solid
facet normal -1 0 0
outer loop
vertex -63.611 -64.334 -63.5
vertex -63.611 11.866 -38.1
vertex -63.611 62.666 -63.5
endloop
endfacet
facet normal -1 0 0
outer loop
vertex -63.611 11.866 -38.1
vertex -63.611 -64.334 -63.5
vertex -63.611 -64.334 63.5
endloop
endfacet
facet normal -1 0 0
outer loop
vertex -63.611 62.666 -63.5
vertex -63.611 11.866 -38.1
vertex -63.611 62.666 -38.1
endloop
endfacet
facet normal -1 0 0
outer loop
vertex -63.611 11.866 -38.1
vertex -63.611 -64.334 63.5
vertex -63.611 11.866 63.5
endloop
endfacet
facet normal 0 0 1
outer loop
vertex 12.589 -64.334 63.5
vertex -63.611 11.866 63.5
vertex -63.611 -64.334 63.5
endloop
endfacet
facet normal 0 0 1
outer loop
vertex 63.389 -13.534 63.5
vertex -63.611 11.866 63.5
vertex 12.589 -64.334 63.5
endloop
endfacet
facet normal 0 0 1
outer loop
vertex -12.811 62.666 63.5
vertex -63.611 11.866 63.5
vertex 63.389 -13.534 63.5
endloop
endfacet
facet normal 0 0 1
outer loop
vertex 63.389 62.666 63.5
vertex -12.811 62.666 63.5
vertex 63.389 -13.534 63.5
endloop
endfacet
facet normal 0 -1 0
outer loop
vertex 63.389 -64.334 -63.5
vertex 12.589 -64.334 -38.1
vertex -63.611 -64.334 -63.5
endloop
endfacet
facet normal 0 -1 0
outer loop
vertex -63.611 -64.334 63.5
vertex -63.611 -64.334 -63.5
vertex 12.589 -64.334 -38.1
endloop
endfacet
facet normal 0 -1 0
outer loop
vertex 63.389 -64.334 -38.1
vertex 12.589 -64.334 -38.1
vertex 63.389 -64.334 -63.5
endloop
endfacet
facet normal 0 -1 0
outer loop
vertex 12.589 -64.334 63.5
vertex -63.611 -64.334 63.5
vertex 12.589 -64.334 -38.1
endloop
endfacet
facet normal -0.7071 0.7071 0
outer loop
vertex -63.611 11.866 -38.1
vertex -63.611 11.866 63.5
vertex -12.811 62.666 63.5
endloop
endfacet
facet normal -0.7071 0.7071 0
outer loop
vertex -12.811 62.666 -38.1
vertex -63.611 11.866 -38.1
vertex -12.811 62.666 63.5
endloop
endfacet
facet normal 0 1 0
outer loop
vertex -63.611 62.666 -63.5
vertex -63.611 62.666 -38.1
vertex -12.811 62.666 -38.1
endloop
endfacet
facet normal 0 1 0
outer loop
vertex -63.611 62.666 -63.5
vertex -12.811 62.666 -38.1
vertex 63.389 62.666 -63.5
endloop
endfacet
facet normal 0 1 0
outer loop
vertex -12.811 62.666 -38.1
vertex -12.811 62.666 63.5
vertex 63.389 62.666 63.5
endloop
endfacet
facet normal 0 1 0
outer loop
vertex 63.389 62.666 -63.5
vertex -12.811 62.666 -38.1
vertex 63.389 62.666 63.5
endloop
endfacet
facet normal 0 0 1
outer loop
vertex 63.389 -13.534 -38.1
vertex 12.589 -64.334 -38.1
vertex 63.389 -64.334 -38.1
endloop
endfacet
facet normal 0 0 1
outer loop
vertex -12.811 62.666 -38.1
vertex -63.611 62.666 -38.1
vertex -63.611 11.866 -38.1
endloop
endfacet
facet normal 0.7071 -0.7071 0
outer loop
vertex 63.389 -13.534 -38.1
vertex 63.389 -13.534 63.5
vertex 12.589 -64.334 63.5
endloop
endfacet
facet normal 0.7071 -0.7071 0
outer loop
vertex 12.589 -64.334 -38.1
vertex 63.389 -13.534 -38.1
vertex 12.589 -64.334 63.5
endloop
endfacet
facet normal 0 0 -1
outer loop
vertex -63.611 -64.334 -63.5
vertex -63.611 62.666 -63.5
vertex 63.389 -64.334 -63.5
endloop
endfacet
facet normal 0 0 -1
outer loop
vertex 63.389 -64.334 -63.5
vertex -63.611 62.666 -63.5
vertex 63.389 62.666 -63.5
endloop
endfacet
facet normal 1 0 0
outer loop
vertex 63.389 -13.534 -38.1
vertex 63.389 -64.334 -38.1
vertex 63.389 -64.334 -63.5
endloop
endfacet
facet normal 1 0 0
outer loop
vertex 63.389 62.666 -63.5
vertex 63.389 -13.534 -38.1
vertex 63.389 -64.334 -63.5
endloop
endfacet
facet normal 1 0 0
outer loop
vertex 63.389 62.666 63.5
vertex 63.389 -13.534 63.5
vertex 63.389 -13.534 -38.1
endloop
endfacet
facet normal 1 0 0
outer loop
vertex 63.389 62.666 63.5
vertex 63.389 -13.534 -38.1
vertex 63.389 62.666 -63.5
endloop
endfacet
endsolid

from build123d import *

# Parameters (mm, degrees)
F0_W     = 127
F0_H     = 127
F1_DEPTH = 63.5
F3_DEPTH = 101.6


with BuildPart() as f1:
    # F0 (on Top) → F1 (new body, symmetric)
    with BuildSketch(Plane.XY):
        with Locations((-0.111125, -0.834118)):
            Rectangle(F0_W, F0_H)
    extrude(amount=F1_DEPTH, both=True)

    # F2 (on face) → F3 (cut)
    with BuildSketch(Plane.XY.offset(63.5)):
        Polygon((63.388875, -64.334118), (63.388875, -13.534118), (12.588875, -64.334118), align=None)
        Polygon((-12.811125, 62.665882), (-63.611125, 62.665882), (-63.611125, 11.865882), align=None)
    extrude(amount=-F3_DEPTH, mode=Mode.SUBTRACT)


solid = f1.part
